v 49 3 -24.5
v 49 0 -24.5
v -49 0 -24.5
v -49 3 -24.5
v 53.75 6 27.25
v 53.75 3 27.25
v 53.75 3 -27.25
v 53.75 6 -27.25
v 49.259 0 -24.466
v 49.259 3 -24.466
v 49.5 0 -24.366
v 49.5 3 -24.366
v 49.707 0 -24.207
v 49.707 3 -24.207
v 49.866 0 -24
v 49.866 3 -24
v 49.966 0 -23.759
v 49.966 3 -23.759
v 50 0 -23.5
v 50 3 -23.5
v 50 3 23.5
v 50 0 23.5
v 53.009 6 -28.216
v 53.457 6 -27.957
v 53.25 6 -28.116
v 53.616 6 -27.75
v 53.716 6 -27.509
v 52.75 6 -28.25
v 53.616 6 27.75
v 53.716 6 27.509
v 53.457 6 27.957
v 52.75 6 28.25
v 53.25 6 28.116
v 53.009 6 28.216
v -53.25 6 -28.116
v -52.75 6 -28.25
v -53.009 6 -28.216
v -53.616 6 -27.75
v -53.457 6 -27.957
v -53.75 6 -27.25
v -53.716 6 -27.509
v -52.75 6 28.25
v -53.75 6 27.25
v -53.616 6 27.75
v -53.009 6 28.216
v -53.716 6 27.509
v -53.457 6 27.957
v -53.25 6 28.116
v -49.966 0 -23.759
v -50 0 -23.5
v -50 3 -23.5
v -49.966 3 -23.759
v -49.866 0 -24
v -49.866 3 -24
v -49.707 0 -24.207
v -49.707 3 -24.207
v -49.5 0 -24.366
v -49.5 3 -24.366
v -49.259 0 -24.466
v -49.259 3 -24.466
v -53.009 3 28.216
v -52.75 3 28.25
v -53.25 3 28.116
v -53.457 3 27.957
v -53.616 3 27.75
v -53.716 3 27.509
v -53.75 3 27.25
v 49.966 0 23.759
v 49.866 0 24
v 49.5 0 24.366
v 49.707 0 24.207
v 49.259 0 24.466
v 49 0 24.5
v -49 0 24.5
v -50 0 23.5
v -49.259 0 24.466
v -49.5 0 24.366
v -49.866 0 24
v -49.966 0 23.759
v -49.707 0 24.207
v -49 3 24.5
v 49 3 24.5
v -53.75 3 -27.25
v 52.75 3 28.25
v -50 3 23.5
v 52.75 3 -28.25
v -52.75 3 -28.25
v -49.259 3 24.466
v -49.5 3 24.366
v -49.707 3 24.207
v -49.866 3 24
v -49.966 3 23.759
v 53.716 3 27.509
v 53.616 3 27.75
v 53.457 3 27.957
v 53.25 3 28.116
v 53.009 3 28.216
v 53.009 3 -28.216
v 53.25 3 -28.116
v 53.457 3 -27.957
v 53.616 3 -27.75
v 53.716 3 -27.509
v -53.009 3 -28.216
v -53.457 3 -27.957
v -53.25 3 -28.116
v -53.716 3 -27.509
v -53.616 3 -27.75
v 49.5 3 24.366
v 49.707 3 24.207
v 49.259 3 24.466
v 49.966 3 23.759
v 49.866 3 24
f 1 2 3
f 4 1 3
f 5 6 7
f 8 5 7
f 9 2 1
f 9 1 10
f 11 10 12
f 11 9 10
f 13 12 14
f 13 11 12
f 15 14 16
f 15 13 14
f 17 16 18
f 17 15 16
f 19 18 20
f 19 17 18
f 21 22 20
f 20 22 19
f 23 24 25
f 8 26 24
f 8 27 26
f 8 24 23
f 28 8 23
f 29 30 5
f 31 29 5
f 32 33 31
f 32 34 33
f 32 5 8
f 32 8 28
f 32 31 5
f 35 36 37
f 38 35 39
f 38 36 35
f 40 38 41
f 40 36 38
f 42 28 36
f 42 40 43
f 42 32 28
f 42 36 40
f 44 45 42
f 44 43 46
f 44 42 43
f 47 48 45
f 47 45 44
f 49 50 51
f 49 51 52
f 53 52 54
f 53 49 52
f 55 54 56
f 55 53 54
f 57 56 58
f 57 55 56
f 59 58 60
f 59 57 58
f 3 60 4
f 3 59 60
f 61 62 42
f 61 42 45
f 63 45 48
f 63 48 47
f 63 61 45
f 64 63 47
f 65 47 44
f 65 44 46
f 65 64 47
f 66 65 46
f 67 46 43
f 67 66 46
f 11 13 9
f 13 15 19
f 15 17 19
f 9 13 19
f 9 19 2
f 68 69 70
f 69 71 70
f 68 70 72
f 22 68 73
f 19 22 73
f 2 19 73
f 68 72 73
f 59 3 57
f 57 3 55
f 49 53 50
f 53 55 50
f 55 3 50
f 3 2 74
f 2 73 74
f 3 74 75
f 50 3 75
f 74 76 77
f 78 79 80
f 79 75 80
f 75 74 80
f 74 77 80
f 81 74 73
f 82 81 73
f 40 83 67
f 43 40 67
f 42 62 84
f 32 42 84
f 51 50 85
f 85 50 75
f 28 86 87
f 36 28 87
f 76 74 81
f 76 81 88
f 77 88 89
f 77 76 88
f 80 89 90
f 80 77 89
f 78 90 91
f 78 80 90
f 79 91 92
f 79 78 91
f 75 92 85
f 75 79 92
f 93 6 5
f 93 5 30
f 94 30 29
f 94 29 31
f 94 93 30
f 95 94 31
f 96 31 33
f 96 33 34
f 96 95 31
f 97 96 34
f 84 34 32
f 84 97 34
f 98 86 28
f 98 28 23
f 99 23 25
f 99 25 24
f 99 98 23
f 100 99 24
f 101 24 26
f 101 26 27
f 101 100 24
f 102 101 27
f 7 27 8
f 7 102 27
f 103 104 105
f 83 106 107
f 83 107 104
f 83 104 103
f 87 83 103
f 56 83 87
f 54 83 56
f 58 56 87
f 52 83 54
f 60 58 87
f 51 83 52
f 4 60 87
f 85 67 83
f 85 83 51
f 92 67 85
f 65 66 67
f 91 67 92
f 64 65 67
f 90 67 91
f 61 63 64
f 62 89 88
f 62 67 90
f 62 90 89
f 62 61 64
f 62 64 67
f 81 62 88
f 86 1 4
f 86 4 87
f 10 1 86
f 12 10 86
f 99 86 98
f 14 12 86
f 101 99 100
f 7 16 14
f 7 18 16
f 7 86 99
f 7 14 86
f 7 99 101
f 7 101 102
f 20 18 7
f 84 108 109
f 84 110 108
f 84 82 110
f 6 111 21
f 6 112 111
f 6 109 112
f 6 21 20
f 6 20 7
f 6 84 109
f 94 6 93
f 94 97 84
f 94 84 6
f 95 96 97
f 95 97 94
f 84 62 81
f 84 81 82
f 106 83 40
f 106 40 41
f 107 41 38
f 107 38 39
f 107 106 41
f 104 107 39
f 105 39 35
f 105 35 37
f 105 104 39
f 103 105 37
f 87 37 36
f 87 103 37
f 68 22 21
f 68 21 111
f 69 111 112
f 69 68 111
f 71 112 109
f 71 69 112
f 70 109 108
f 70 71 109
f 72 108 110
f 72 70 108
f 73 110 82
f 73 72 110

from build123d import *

# Parameters (mm, degrees)
PAD_DEPTH    = 6
SKETCH001_W  = 150
SKETCH001_H  = 73.5
POCKET_DEPTH = 3


with BuildPart() as part:
    # Sketch → Pad (new body)
    with BuildSketch(Plane.XZ):
        with BuildLine():
            Line((-52.75, 28.25), (52.75, 28.25))
            ThreePointArc((53.75, 27.25), (53.457107, 27.957107), (52.75, 28.25))
            Line((53.75, 27.25), (53.75, -27.25))
            ThreePointArc((52.75, -28.25), (53.457107, -27.957107), (53.75, -27.25))
            Line((52.75, -28.25), (-52.75, -28.25))
            ThreePointArc((-53.75, -27.25), (-53.457107, -27.957107), (-52.75, -28.25))
            Line((-53.75, -27.25), (-53.75, 27.25))
            ThreePointArc((-52.75, 28.25), (-53.457107, 27.957107), (-53.75, 27.25))
        make_face()
    extrude(amount=-PAD_DEPTH)

    # Sketch001 → Pocket (cut)
    with BuildSketch(Plane.XZ):
        Rectangle(SKETCH001_W, SKETCH001_H)
        with BuildLine():
            Line((-49, 24.5), (49, 24.5))
            ThreePointArc((50, 23.5), (49.707107, 24.207107), (49, 24.5))
            Line((50, 23.5), (50, -23.5))
            ThreePointArc((49, -24.5), (49.707107, -24.207107), (50, -23.5))
            Line((49, -24.5), (-49, -24.5))
            ThreePointArc((-50, -23.5), (-49.707107, -24.207107), (-49, -24.5))
            Line((-50, -23.5), (-50, 23.5))
            ThreePointArc((-49, 24.5), (-49.707107, 24.207107), (-50, 23.5))
        make_face(mode=Mode.SUBTRACT)
    extrude(amount=-POCKET_DEPTH, mode=Mode.SUBTRACT)


solid = part.part
